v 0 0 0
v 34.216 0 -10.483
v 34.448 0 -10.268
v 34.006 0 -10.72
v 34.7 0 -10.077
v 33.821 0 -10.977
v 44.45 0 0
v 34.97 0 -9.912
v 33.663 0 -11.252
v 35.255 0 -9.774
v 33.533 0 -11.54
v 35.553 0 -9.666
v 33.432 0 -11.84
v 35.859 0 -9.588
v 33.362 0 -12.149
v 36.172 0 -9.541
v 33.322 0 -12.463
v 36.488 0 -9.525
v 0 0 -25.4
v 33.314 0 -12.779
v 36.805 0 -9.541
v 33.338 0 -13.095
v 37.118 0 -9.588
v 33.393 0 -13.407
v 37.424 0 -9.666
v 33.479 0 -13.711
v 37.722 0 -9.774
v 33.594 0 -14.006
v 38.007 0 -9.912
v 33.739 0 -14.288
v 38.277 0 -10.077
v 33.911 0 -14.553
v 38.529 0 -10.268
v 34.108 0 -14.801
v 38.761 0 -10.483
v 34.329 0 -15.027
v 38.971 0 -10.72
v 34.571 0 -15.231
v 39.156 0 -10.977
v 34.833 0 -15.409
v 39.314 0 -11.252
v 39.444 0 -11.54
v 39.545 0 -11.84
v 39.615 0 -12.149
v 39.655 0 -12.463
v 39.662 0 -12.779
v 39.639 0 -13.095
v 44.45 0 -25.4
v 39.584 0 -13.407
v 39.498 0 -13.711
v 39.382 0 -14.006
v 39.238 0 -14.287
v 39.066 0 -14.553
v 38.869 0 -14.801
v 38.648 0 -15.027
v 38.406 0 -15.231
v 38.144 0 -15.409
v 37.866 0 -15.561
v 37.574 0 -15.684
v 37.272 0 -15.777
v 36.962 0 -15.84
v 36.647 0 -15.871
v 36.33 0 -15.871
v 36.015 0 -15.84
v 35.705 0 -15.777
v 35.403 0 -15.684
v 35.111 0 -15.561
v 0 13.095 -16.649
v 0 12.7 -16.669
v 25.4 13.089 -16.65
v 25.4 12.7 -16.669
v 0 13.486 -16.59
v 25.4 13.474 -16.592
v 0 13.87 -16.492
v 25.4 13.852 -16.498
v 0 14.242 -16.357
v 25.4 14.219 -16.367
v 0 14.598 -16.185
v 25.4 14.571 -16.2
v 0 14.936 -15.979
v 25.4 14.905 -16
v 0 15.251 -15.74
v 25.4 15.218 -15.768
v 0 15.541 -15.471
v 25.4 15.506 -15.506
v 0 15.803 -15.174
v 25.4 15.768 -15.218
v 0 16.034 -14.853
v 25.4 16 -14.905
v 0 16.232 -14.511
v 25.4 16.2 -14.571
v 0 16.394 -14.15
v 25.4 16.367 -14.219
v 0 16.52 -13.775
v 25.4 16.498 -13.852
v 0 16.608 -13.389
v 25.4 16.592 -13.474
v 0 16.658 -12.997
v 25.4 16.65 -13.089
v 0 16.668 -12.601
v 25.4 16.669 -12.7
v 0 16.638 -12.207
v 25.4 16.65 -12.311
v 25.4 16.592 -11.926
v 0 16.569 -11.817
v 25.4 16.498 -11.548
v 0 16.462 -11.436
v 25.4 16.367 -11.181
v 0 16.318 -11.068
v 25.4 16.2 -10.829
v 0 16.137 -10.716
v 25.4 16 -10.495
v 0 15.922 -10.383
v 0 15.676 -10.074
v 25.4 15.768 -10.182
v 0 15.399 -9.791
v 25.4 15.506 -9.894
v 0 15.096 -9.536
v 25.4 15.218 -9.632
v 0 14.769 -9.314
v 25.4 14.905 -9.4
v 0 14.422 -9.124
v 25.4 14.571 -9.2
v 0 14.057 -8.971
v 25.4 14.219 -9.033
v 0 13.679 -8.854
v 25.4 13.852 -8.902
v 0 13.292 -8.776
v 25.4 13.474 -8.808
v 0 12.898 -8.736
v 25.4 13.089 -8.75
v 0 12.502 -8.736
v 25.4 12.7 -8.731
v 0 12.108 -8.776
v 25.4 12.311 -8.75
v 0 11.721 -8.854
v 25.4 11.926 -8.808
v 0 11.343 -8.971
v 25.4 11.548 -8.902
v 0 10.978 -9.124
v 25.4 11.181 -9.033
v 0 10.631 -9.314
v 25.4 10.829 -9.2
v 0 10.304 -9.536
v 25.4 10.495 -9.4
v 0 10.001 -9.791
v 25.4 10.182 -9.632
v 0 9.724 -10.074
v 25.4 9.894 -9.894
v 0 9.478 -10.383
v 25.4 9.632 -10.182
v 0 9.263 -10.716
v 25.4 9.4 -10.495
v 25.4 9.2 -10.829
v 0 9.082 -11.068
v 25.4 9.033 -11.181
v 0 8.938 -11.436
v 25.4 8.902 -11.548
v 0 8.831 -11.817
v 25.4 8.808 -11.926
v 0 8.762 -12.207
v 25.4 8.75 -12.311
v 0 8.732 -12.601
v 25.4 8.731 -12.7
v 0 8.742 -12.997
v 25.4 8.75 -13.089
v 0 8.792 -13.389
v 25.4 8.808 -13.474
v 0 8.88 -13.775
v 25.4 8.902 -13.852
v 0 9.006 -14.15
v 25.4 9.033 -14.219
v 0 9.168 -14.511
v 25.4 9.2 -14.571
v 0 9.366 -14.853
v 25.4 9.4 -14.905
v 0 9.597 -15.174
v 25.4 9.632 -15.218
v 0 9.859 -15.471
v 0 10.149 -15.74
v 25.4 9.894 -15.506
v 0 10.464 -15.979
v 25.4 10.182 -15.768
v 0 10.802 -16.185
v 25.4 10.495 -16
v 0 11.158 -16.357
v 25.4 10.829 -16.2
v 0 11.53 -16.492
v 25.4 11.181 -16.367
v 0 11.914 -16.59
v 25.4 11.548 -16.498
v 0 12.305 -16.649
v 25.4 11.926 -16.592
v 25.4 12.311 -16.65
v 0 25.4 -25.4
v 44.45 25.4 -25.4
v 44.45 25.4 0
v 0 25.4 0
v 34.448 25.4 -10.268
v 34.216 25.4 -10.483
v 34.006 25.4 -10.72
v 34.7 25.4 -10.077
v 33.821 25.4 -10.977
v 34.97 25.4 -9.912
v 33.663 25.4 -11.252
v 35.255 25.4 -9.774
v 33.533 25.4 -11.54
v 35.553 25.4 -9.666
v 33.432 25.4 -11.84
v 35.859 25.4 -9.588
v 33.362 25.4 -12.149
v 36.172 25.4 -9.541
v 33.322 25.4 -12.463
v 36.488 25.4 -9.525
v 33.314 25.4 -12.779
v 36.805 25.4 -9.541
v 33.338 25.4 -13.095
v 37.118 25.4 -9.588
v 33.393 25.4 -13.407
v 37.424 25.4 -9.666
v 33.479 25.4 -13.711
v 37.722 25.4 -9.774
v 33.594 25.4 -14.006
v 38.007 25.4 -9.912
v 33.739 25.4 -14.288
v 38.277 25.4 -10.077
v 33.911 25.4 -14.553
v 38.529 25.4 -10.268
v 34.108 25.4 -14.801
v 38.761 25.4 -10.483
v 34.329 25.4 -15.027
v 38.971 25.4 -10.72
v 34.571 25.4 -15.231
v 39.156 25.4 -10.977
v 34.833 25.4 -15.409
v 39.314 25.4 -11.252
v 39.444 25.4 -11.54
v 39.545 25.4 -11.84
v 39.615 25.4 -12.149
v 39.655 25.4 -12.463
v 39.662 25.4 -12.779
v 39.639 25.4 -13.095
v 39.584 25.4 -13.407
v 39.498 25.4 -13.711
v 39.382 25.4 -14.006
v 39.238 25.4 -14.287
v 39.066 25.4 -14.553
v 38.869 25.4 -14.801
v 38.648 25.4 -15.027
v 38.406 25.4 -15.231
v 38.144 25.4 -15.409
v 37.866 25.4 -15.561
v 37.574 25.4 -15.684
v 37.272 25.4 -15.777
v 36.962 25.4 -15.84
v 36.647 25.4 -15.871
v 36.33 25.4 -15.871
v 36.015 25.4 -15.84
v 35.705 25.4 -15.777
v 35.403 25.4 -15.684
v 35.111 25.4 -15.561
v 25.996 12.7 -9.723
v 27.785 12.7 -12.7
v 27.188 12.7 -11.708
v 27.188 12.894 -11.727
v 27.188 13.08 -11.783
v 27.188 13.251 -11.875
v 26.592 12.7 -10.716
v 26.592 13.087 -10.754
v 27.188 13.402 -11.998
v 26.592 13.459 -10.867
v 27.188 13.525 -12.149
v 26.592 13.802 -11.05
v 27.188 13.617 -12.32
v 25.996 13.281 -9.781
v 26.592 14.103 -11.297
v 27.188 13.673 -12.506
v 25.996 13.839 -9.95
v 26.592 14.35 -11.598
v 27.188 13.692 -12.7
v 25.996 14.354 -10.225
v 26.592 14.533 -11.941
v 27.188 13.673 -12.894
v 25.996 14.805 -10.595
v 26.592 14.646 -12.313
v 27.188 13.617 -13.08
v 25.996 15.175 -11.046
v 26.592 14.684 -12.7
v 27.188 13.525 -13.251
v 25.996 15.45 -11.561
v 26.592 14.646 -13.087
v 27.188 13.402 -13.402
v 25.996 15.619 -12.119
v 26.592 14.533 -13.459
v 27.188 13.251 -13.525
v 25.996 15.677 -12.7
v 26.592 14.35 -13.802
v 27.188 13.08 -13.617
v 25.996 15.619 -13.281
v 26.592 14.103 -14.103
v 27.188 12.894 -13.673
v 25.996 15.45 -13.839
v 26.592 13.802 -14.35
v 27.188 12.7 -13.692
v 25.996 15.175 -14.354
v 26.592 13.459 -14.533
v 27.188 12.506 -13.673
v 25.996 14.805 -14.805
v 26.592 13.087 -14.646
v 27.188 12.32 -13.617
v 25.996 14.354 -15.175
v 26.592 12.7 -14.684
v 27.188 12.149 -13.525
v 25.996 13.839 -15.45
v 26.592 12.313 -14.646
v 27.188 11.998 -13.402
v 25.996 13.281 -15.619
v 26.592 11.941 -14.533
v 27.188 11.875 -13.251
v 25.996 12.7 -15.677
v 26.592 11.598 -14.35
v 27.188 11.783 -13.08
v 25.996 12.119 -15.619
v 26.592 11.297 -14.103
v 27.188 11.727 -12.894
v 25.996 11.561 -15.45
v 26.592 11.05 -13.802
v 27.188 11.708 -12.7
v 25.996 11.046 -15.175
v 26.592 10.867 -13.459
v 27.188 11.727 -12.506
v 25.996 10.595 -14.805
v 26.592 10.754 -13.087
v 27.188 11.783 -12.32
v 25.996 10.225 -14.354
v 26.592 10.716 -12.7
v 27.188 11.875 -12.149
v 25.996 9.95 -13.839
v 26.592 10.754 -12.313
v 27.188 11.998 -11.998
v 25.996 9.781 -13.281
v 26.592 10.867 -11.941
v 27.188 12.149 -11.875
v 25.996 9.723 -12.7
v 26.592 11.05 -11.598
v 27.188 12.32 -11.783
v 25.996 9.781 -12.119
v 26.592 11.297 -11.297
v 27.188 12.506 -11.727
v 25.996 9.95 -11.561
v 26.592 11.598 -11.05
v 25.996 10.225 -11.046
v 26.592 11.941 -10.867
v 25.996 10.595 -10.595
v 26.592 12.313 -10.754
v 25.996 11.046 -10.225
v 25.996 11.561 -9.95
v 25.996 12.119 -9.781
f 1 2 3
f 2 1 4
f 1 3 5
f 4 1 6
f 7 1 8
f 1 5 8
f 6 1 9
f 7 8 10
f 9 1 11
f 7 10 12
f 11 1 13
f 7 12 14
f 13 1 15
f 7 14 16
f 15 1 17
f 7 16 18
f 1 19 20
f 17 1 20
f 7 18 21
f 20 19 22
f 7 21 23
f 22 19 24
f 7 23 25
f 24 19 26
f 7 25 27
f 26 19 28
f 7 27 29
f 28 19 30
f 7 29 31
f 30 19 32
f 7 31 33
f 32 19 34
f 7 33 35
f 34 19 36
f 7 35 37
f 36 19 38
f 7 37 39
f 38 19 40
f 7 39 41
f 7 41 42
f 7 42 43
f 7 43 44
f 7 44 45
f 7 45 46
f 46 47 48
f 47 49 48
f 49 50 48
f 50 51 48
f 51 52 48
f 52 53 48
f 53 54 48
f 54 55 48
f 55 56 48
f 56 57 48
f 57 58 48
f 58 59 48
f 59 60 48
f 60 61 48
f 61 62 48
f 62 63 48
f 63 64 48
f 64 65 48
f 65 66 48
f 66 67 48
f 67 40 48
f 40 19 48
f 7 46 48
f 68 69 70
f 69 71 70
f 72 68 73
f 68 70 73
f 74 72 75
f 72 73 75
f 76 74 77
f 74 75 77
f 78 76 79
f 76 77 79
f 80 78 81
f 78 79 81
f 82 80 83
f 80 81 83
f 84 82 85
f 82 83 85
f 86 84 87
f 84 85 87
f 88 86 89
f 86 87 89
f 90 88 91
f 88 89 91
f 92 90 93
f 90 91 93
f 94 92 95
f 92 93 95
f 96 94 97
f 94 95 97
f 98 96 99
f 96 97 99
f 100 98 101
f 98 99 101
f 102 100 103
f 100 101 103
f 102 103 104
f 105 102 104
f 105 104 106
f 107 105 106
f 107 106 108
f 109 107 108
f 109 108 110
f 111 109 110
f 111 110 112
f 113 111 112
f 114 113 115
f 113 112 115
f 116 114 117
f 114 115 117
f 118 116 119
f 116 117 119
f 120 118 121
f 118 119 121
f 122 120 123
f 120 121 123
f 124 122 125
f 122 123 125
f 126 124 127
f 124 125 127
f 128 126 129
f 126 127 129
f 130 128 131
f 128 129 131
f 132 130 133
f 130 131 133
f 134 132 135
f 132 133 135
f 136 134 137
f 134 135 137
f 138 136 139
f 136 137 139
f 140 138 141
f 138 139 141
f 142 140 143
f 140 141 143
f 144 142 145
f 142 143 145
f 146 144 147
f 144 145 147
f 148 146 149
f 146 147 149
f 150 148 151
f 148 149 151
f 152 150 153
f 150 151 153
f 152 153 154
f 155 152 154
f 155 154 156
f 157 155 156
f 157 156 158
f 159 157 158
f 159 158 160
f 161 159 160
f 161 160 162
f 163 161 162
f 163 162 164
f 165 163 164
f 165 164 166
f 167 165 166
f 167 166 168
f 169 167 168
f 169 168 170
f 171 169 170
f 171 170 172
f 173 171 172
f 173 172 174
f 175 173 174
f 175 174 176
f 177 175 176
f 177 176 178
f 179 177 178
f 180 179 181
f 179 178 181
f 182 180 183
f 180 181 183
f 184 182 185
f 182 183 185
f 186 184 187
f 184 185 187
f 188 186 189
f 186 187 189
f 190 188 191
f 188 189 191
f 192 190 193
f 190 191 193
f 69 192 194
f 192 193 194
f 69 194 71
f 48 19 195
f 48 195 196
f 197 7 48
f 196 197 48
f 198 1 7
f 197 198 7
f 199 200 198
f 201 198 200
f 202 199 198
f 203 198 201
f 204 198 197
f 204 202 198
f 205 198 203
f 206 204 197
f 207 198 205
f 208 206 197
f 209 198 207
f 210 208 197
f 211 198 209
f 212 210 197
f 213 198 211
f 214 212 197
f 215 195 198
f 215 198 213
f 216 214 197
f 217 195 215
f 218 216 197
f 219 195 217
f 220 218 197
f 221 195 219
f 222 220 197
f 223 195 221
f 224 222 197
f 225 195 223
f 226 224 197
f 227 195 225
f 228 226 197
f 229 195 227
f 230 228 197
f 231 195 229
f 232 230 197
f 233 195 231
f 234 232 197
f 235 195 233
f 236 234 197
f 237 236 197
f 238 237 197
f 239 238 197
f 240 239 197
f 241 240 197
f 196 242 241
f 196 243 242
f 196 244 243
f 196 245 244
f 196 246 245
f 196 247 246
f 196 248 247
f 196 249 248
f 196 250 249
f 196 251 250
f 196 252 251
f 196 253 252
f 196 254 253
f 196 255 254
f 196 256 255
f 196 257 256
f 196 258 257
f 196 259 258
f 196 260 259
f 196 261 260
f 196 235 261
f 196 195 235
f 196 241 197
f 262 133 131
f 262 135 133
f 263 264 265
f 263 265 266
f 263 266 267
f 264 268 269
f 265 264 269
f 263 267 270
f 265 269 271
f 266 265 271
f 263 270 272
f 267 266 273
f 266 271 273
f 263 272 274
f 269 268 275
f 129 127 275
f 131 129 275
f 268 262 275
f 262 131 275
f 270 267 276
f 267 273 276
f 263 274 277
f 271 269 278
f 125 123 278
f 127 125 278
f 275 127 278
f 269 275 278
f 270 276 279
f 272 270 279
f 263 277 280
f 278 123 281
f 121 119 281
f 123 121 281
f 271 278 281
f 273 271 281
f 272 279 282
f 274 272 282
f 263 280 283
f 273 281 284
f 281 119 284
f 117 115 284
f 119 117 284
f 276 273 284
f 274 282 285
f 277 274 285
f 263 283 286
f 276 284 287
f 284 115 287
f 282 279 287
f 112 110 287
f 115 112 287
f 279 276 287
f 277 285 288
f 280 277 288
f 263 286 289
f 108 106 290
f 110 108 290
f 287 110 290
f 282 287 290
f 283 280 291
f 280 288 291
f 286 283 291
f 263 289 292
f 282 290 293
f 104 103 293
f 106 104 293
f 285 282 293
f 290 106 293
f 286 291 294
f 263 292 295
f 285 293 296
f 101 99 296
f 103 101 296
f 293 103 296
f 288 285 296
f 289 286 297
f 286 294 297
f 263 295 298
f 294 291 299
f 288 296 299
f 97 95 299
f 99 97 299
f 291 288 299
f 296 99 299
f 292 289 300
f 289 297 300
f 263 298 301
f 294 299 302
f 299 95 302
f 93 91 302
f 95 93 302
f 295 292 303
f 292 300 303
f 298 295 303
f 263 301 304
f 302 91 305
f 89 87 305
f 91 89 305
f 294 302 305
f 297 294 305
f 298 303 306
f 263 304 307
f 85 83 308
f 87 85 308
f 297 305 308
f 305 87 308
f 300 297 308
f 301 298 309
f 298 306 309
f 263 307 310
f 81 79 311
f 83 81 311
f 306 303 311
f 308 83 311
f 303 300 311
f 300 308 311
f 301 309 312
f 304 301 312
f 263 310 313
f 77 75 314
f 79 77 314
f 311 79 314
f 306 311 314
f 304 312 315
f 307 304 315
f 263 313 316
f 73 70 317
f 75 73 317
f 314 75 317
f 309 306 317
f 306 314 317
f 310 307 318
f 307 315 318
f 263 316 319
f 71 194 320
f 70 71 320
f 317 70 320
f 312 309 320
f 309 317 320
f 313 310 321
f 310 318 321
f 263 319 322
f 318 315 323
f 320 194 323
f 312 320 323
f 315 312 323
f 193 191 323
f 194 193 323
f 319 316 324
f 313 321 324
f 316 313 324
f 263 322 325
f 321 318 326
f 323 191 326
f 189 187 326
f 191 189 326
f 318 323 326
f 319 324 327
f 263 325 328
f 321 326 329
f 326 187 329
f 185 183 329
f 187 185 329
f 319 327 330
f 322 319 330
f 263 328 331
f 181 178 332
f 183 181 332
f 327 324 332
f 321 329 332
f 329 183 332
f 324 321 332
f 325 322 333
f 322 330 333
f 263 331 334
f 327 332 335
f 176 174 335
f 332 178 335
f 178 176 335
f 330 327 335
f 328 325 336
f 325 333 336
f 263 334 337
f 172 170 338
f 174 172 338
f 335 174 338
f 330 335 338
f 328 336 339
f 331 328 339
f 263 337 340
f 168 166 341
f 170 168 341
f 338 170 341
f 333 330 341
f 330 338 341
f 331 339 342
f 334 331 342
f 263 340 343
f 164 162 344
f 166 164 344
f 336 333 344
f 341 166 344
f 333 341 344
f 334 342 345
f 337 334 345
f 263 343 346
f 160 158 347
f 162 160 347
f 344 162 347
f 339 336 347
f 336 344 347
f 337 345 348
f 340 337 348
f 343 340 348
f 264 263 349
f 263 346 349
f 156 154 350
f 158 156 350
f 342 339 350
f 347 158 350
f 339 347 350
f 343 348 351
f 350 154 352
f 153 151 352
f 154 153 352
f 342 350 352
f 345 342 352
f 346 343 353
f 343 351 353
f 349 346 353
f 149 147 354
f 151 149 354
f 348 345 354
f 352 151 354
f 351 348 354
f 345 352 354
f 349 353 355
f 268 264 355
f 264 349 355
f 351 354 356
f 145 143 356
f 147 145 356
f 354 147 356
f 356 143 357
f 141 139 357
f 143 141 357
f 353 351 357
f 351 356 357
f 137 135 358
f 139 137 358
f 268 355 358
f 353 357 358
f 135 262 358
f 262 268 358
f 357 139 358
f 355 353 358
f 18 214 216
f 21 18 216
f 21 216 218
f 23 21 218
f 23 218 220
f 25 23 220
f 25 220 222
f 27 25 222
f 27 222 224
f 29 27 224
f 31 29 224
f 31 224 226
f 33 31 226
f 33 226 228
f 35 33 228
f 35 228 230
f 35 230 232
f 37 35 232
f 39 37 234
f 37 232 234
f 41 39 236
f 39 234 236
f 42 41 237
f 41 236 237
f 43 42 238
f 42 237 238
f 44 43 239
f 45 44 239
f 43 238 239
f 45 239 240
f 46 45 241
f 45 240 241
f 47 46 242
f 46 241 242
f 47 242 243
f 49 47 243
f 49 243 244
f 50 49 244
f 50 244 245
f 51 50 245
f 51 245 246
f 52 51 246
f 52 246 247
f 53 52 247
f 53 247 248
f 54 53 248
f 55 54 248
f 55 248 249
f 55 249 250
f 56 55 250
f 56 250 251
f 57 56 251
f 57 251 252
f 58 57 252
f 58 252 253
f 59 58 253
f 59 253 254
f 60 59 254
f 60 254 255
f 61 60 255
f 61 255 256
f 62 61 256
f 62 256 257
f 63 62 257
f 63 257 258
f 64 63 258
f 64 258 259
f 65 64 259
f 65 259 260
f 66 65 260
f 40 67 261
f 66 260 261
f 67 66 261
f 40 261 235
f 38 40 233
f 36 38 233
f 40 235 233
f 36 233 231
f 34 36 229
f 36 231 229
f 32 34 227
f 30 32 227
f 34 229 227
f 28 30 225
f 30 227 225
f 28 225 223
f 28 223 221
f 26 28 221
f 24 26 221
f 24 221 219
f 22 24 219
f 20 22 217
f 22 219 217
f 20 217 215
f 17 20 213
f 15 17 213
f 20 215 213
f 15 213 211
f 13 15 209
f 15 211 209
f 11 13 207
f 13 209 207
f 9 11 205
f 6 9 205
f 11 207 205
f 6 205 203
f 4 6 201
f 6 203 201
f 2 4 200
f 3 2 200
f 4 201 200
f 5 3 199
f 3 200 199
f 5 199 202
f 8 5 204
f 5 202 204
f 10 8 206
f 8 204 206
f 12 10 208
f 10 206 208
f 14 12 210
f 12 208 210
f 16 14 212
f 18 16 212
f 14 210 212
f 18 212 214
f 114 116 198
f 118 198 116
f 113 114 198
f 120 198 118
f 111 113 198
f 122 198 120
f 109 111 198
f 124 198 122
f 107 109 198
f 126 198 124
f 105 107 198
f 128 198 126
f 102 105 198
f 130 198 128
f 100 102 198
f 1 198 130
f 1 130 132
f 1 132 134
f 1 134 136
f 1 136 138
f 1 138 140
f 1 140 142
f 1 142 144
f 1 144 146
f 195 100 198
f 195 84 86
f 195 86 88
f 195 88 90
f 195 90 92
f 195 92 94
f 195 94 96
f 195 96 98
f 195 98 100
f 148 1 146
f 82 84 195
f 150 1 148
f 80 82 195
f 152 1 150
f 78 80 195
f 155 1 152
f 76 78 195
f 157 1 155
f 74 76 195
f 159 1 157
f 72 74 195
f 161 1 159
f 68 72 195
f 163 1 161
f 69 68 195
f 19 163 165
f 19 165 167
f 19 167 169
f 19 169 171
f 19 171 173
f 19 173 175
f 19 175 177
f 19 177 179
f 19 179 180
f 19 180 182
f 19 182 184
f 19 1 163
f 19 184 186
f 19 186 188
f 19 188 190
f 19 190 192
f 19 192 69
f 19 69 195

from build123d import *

# Parameters (mm, degrees)
SKETCH1_W                   = 44.45
SKETCH1_H                   = 25.4
BOSS_EXTRUDE1_DEPTH         = 25.4
SKETCH2_R                   = 3.175
CUT_EXTRUDE1_DEPTH          = 58.15
F_3_8_16_TAPPED_HOLE1_D     = 7.9375
F_3_8_16_TAPPED_HOLE1_DEPTH = 25.4
F_3_8_16_TAPPED_HOLE1_TIP   = 2.384665582


with BuildPart() as part:
    # Sketch1 → Boss-Extrude1 (new body)
    with BuildSketch(Plane(origin=(0, 0, 0), x_dir=(1, 0, 0), z_dir=(0, 1, 0))):
        with Locations((22.225, 12.7)):
            Rectangle(SKETCH1_W, SKETCH1_H)
    extrude(amount=BOSS_EXTRUDE1_DEPTH)

    # Sketch2 → Cut-Extrude1 (cut, through all)
    with BuildSketch(Plane(origin=(0, 25.4, 0), x_dir=(1, 0, 0), z_dir=(0, 1, 0))):
        with Locations(Location((36.48842715, 12.7, 0), (0, 0, 270))):
            Circle(SKETCH2_R)
    extrude(amount=-CUT_EXTRUDE1_DEPTH, mode=Mode.SUBTRACT)

    # 3/8-16 Tapped Hole1
    with Locations(Plane.ZY):
        with Locations((-12.7, 12.7)):
            Hole(F_3_8_16_TAPPED_HOLE1_D / 2, depth=F_3_8_16_TAPPED_HOLE1_DEPTH)
            with Locations((0, 0, -(F_3_8_16_TAPPED_HOLE1_DEPTH + F_3_8_16_TAPPED_HOLE1_TIP / 2))):  # 118° drill point
                Cone(0, F_3_8_16_TAPPED_HOLE1_D / 2, F_3_8_16_TAPPED_HOLE1_TIP, mode=Mode.SUBTRACT)


solid = part.part
